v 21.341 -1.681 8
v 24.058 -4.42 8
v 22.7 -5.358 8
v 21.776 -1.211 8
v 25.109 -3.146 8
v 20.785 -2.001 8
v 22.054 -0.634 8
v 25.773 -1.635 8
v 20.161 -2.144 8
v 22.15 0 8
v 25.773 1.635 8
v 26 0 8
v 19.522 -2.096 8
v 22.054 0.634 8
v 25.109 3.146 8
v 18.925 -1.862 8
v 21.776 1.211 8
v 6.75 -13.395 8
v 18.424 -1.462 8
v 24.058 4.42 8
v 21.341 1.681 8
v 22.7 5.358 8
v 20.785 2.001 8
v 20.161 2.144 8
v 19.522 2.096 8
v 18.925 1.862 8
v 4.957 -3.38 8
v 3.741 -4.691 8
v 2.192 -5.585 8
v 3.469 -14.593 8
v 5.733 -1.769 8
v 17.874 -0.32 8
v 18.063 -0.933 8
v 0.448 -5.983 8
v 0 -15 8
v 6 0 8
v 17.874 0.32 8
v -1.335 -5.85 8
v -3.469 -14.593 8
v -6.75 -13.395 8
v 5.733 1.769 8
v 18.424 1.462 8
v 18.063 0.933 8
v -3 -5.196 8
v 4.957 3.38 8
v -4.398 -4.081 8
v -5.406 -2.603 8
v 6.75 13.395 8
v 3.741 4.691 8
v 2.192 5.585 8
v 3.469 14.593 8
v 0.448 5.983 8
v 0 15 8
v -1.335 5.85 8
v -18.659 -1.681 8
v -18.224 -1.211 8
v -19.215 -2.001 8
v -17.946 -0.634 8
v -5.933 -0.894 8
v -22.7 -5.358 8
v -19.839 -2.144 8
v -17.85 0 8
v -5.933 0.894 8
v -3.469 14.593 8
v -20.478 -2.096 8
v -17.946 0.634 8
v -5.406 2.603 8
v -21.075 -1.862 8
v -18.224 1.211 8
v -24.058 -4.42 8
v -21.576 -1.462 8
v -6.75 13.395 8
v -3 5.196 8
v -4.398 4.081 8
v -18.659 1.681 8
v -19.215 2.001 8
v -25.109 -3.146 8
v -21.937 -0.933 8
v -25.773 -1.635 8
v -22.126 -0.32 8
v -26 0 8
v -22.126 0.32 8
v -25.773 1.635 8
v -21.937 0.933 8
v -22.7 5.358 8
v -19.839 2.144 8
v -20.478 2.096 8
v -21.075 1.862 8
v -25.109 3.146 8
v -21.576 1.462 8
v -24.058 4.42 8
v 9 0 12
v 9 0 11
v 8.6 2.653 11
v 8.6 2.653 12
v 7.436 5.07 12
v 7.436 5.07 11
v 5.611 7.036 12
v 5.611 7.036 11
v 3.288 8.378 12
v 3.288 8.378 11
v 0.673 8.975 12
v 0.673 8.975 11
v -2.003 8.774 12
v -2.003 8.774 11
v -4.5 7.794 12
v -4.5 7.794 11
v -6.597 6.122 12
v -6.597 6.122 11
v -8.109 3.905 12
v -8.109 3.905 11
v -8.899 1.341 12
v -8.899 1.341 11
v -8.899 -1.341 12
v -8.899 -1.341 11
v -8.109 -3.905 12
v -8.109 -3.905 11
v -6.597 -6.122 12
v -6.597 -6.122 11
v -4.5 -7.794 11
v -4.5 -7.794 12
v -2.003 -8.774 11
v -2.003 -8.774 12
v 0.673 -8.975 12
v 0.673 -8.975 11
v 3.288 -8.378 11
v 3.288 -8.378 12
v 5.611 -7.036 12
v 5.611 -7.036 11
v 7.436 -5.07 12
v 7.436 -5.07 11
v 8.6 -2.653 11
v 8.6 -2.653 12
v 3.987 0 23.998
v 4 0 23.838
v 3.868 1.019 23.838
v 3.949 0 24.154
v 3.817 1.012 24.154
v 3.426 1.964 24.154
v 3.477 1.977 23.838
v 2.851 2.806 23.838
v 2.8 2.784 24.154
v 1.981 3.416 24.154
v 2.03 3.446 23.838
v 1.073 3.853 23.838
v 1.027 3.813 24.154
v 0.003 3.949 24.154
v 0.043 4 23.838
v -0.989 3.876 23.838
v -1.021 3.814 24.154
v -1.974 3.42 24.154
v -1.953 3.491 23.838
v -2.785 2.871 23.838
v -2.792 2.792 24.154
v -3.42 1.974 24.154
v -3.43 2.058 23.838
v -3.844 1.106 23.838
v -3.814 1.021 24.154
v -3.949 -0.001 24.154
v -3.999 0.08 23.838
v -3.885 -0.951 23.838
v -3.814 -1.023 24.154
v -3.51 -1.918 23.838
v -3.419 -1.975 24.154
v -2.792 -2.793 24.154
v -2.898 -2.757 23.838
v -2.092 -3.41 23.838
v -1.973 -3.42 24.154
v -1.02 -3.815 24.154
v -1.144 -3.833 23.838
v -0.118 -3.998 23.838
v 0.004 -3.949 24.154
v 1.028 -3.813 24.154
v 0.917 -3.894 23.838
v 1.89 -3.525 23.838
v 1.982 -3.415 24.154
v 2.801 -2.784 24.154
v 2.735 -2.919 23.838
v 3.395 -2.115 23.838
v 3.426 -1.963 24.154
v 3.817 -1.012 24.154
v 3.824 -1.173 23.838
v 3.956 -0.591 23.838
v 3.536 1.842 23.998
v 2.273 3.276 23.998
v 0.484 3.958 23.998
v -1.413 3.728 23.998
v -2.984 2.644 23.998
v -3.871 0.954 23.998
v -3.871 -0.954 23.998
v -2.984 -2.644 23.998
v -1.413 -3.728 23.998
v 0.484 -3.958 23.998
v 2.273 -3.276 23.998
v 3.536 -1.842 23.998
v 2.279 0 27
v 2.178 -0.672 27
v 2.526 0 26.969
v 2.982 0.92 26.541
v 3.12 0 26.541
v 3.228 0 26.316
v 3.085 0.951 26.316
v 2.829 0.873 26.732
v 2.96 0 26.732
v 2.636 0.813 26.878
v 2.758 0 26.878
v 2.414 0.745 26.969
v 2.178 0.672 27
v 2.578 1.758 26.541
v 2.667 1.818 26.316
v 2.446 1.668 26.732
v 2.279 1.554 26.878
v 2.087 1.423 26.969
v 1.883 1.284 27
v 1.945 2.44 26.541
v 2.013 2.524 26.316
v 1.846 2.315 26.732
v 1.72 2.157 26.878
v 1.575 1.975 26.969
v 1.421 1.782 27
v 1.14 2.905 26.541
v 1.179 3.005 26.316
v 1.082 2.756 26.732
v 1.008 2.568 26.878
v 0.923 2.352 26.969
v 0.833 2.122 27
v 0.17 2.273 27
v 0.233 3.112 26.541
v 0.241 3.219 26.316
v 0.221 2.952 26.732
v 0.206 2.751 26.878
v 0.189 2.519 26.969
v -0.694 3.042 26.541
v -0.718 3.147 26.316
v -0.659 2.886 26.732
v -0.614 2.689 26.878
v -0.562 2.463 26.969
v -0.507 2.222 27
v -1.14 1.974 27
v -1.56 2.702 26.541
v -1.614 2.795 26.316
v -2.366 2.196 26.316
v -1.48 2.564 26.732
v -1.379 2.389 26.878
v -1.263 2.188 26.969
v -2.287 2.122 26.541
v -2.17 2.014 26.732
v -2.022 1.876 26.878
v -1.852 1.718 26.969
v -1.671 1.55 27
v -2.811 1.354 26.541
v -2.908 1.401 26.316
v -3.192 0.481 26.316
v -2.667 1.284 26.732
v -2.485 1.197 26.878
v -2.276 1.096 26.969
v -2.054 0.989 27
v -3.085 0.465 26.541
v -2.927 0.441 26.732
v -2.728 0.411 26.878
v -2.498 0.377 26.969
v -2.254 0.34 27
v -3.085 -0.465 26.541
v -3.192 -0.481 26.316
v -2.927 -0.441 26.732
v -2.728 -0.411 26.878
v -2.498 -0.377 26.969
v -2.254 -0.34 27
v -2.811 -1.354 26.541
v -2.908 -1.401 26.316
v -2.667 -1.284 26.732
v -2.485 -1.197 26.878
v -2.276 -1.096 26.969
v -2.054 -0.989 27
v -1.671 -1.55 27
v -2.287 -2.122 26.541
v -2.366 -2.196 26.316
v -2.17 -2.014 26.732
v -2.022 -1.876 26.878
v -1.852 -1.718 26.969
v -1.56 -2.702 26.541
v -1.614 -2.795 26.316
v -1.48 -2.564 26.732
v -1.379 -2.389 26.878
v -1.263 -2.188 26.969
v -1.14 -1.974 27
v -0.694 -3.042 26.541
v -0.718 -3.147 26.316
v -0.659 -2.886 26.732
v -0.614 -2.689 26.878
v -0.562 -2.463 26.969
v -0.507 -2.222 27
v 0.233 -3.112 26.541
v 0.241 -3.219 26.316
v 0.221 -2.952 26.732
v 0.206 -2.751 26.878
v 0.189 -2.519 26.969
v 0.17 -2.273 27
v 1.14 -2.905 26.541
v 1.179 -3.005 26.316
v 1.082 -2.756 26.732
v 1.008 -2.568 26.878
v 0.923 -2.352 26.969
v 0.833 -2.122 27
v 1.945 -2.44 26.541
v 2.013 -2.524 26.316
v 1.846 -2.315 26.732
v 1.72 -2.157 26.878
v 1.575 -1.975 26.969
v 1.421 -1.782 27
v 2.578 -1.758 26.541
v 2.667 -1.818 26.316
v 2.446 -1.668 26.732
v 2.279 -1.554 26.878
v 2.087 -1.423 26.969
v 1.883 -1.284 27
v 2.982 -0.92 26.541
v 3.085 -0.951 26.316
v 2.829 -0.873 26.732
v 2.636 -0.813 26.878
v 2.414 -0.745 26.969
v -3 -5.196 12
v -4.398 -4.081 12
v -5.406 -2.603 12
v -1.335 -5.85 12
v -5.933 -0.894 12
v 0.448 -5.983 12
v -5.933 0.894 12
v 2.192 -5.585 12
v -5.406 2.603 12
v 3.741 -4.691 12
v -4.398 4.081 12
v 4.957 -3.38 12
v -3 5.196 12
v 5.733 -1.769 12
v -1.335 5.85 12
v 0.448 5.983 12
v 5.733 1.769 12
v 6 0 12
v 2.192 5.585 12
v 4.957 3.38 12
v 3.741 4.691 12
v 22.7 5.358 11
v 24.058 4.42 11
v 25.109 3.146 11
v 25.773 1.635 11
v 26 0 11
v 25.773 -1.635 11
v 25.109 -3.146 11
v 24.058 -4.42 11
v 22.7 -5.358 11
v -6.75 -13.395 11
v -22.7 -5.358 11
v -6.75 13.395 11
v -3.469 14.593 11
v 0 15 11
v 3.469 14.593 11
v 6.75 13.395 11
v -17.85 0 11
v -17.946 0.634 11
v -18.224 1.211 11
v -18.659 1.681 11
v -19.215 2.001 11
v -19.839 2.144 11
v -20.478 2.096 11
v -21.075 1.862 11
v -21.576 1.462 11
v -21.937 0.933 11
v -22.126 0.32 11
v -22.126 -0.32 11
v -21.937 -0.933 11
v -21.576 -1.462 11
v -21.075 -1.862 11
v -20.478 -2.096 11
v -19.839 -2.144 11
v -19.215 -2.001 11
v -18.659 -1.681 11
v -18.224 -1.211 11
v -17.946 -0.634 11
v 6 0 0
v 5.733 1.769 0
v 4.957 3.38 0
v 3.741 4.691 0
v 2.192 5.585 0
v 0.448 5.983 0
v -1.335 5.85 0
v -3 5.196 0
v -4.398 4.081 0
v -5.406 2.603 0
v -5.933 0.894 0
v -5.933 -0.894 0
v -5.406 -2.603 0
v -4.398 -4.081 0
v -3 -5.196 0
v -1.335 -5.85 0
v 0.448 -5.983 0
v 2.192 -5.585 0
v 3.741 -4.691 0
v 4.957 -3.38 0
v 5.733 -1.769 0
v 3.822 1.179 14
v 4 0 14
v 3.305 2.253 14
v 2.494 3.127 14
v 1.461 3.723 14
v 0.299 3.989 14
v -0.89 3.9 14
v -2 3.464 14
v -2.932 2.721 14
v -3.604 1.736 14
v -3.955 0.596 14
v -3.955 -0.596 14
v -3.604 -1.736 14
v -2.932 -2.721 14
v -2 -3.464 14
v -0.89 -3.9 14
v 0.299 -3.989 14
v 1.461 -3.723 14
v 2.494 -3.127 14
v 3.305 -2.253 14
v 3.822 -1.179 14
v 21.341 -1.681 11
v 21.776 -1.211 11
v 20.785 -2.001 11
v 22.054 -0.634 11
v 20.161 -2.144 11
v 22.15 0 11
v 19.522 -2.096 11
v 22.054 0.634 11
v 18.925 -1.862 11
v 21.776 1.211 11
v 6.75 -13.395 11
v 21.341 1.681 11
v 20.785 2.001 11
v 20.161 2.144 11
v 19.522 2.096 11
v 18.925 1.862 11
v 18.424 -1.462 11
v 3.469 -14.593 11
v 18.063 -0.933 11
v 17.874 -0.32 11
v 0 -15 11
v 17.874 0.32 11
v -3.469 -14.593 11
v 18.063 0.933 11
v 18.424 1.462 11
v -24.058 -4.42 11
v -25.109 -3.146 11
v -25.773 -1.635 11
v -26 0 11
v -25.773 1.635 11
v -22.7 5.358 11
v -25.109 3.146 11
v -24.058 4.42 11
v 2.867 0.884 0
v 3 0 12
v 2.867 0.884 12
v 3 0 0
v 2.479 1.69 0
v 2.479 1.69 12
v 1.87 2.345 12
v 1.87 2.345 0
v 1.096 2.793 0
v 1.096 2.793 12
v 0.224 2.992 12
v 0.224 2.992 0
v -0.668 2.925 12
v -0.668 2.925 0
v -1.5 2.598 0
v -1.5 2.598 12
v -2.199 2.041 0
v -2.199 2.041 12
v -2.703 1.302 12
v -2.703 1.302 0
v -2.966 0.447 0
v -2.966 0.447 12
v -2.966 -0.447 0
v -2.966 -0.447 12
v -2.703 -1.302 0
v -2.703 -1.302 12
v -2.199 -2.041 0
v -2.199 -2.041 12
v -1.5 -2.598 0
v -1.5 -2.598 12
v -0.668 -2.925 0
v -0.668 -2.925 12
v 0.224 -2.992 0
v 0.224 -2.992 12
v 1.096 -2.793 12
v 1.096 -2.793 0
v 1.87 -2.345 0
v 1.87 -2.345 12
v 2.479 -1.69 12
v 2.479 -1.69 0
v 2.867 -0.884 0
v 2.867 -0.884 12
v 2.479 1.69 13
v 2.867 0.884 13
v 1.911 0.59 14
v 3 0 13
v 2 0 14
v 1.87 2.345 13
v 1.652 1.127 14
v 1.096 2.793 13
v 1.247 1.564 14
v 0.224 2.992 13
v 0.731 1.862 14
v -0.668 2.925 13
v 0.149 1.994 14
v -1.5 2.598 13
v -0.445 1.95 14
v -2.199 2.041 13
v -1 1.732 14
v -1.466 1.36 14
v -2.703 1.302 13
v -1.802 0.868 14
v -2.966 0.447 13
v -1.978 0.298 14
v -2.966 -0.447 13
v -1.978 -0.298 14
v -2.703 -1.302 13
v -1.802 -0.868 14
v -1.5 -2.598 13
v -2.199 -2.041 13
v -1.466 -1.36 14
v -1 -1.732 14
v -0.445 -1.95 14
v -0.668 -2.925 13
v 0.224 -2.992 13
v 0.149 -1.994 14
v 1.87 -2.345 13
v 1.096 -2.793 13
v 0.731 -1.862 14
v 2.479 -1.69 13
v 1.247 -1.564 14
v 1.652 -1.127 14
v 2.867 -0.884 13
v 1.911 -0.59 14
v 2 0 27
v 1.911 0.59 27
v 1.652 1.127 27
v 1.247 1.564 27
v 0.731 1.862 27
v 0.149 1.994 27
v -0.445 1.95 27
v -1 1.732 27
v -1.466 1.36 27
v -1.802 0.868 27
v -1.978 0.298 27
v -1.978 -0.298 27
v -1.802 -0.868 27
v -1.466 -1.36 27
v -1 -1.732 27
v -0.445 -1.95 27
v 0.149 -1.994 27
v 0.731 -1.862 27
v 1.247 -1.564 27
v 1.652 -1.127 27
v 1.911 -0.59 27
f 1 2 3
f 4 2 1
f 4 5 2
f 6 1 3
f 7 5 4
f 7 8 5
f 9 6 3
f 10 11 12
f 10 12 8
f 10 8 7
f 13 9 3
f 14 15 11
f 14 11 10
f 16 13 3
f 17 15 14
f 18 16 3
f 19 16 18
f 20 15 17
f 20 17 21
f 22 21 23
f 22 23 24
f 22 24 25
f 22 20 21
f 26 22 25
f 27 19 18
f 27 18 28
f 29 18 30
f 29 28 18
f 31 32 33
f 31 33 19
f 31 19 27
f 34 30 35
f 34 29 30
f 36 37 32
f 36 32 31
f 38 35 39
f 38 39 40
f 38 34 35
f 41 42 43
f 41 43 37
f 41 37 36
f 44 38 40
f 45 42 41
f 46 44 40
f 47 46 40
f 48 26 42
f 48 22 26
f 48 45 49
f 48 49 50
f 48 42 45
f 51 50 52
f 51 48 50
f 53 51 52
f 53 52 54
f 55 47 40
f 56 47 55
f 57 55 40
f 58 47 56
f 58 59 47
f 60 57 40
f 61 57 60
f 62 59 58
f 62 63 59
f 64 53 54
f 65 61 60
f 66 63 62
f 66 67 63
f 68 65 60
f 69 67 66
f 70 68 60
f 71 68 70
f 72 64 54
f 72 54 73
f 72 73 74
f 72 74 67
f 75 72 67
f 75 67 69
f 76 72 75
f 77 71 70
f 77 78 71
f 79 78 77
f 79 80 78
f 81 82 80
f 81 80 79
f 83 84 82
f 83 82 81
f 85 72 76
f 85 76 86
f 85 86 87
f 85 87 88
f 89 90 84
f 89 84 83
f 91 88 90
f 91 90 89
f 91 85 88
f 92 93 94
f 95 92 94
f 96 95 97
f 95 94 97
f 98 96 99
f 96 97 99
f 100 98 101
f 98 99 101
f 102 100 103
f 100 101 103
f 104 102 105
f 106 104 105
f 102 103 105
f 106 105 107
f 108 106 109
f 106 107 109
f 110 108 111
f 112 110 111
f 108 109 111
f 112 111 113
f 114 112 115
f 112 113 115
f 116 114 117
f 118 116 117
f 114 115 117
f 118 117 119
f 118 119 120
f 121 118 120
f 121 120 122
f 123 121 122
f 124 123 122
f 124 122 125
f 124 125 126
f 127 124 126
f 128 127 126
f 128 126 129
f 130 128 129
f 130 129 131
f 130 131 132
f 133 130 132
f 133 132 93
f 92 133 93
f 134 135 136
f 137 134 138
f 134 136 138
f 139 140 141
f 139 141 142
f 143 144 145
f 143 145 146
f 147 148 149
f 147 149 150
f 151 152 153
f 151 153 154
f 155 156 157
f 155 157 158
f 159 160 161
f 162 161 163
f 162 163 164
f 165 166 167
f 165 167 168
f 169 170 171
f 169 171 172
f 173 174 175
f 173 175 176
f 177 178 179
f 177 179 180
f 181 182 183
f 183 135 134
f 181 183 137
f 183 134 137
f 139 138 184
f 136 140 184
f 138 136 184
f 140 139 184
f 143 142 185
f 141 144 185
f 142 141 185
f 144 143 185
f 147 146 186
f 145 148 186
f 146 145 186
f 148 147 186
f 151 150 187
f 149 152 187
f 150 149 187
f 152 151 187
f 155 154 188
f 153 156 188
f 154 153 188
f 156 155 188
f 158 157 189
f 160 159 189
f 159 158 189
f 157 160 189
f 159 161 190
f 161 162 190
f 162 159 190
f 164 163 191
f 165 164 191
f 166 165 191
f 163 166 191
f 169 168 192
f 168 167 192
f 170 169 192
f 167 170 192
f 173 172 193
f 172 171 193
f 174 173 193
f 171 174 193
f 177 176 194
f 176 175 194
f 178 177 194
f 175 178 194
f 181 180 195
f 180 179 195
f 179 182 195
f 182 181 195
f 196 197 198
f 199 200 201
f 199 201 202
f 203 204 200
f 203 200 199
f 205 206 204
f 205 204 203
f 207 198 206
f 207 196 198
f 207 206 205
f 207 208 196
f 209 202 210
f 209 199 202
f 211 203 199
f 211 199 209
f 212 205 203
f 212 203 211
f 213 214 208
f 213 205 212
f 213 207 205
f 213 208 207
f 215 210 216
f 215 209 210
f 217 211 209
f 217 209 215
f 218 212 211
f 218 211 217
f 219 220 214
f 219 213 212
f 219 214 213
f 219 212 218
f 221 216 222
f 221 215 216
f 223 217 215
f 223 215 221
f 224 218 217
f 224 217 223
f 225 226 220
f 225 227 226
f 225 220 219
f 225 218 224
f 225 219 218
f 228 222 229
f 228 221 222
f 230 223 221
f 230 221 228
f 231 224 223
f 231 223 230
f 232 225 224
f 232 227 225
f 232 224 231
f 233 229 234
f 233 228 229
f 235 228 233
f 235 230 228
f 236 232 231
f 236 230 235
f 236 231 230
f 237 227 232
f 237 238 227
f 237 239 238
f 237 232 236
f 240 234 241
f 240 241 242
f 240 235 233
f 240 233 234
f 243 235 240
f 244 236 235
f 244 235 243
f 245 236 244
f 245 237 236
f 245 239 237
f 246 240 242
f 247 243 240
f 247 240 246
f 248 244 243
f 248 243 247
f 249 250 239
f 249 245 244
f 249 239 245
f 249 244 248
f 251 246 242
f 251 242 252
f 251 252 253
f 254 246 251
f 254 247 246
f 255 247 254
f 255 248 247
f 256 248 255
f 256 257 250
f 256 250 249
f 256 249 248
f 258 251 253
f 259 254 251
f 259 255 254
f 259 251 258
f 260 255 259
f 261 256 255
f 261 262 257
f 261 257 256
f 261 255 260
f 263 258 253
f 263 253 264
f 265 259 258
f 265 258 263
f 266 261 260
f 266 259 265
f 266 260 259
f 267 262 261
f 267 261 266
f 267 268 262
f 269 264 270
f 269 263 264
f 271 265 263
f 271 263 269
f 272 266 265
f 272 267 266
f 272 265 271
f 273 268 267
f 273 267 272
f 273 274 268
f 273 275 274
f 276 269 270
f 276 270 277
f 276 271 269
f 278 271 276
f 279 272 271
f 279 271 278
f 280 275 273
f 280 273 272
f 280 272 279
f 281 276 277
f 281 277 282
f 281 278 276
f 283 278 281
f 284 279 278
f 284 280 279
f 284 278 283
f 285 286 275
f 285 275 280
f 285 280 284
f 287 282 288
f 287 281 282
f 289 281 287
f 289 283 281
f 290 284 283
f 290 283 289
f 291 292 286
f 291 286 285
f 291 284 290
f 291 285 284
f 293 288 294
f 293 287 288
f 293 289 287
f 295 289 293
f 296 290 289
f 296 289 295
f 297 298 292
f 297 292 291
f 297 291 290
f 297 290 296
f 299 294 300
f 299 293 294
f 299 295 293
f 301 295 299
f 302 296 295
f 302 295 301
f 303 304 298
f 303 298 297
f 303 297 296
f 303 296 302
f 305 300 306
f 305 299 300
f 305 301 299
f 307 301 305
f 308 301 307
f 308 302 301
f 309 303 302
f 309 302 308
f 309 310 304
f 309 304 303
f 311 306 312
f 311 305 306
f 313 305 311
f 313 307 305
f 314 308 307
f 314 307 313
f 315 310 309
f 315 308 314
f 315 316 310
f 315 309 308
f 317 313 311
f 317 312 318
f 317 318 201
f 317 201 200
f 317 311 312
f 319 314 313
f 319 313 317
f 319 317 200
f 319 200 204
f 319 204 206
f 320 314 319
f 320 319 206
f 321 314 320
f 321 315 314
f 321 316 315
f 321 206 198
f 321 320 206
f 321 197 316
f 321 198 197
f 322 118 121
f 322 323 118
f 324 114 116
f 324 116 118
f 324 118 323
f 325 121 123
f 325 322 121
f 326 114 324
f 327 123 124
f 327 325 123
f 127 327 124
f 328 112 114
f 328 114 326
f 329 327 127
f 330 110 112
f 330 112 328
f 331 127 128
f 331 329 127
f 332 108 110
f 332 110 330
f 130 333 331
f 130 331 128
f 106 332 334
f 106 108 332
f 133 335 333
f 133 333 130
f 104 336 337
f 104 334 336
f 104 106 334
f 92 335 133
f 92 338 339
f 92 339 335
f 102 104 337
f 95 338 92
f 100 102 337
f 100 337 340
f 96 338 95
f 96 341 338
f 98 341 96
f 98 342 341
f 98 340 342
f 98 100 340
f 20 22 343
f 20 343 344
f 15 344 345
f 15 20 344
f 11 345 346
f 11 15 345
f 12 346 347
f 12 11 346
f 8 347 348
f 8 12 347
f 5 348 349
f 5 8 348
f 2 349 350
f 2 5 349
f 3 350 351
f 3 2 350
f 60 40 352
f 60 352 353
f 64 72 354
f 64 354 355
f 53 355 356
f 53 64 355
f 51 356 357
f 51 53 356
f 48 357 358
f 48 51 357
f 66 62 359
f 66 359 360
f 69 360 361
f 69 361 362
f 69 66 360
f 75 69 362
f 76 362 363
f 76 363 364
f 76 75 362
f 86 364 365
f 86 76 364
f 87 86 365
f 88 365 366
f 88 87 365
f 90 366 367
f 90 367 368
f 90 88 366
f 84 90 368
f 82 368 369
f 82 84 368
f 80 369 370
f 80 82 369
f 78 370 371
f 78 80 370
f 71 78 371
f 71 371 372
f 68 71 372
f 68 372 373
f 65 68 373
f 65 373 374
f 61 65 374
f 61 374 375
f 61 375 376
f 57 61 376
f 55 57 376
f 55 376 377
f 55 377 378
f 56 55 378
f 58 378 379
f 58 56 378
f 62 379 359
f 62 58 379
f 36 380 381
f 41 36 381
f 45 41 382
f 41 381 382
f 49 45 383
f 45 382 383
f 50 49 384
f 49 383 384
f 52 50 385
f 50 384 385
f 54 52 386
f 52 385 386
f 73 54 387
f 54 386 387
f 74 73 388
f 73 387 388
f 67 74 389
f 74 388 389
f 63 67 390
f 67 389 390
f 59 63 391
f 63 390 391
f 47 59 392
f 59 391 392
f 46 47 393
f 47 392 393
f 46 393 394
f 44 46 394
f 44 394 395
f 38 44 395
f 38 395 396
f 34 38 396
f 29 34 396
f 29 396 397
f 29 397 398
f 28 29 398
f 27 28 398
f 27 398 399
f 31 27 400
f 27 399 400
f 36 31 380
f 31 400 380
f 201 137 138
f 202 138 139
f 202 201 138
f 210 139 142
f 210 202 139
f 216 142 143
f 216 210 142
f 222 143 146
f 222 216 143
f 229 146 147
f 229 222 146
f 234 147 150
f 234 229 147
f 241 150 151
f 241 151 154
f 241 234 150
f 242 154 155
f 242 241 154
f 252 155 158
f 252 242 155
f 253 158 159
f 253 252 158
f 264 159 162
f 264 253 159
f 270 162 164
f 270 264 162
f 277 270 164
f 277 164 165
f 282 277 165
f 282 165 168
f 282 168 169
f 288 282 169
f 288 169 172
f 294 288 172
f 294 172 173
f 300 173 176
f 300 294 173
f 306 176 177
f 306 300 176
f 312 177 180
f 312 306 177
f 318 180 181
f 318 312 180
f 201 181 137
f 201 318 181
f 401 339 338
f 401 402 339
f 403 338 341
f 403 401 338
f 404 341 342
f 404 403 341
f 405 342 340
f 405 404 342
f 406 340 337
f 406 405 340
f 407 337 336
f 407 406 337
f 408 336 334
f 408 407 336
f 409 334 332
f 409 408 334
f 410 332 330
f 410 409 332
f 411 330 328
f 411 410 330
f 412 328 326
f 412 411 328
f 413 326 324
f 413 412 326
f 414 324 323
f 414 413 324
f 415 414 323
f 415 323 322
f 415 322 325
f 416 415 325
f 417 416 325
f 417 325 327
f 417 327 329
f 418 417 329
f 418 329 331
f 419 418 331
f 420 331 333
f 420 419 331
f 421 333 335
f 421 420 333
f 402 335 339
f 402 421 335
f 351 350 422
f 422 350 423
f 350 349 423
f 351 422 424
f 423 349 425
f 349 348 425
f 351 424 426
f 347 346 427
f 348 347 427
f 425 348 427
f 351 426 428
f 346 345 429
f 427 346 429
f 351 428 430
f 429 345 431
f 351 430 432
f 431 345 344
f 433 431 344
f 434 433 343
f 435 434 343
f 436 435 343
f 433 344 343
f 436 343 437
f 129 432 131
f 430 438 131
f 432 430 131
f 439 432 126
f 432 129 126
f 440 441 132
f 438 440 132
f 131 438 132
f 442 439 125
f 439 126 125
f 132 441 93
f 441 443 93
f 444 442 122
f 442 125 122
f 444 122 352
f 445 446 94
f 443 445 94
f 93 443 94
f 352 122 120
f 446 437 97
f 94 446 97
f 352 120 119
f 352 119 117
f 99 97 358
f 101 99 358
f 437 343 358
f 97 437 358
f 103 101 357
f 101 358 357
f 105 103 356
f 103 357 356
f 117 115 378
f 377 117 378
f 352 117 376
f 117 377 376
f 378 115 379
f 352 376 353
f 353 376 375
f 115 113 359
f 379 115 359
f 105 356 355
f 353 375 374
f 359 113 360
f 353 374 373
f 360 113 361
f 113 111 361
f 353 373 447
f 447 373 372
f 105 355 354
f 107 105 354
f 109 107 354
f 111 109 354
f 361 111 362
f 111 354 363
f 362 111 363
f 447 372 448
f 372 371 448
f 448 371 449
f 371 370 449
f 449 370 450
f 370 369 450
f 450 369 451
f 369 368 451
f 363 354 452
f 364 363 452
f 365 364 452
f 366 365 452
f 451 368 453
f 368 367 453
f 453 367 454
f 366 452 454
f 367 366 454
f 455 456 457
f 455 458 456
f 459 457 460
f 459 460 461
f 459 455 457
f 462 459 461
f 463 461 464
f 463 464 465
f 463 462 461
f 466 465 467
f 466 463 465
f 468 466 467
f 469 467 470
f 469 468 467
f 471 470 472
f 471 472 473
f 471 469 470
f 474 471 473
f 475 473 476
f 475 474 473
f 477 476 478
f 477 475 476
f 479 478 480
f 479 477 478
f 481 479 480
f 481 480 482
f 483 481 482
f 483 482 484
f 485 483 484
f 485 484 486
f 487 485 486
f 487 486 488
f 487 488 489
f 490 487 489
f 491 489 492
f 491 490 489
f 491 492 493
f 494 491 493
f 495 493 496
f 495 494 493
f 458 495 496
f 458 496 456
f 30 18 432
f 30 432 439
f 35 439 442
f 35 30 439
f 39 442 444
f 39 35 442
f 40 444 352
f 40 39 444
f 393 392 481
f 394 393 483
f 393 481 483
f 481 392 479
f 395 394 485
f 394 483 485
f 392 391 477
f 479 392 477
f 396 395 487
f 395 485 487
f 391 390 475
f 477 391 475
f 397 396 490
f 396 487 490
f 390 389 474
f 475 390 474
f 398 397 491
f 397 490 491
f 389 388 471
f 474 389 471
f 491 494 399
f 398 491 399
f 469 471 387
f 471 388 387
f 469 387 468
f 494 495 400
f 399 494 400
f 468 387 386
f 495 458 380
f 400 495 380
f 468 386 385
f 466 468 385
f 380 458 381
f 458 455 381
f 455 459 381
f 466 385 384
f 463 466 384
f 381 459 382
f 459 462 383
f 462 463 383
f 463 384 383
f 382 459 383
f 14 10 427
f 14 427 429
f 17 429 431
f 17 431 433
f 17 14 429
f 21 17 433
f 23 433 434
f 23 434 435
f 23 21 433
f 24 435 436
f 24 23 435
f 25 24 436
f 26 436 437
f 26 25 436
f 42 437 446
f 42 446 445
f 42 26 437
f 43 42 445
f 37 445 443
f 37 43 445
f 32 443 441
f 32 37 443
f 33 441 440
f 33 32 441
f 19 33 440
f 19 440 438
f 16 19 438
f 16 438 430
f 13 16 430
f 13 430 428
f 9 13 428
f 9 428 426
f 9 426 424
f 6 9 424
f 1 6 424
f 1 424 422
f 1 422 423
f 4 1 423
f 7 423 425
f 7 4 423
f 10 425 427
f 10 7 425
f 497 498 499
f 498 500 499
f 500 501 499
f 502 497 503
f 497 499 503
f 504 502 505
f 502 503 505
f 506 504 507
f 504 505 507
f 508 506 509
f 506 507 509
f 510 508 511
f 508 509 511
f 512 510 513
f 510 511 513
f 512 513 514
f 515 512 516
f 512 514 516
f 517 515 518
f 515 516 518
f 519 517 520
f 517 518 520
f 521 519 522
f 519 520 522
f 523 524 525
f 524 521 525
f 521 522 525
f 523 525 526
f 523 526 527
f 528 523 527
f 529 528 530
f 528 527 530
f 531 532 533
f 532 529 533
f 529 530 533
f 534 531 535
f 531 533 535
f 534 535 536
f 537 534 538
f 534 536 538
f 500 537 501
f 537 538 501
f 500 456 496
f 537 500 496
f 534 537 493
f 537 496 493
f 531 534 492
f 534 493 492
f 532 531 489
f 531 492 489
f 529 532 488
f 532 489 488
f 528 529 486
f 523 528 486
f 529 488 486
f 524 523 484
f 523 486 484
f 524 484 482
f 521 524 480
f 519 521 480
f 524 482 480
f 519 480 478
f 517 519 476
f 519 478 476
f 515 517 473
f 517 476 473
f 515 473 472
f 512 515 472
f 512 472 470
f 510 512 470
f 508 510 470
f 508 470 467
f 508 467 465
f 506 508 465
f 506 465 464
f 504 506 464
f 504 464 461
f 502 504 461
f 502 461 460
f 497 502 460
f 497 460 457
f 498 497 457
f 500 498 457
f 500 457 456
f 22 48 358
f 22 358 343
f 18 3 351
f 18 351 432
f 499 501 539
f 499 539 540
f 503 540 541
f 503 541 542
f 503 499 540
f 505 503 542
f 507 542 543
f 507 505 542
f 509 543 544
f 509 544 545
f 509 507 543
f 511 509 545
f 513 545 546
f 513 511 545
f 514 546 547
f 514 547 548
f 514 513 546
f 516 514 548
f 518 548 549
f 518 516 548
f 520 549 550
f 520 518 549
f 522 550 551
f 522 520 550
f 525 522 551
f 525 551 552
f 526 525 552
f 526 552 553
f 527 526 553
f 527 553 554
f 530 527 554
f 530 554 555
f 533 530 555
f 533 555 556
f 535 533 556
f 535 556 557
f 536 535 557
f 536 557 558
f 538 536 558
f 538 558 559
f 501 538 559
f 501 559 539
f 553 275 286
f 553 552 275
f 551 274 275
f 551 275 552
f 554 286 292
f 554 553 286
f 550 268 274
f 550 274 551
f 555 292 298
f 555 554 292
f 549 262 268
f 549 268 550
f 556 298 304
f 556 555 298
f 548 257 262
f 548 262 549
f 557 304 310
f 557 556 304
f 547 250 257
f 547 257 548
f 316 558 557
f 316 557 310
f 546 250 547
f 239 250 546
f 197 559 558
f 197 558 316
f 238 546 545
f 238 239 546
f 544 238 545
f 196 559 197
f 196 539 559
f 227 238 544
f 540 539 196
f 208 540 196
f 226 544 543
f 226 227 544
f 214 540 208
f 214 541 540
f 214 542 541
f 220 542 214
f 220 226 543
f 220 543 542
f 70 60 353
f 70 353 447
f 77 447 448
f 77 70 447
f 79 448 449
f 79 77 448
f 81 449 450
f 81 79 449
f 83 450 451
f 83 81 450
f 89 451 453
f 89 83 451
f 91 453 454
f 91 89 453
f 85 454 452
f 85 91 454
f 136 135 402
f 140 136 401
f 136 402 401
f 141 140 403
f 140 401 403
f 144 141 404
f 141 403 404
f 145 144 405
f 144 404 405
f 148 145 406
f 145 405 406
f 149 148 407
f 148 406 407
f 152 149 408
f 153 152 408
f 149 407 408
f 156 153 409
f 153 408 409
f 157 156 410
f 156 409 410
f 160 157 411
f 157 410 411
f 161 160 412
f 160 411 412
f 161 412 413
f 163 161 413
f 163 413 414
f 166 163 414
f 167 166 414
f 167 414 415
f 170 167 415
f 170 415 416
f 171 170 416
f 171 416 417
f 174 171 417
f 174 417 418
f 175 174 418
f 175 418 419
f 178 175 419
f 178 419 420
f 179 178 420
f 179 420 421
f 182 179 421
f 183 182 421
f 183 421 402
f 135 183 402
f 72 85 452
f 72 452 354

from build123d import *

# Parameters (mm, degrees)
SKETCH_1_R      = 6
SKETCH_1_R_2    = 3
EXTRUDE_1_DEPTH = 8
SKETCH_2_R      = 9
SKETCH_2_R_2    = 3
EXTRUDE_2_DEPTH = 4
SKETCH_3_R      = 4
SKETCH_3_R_2    = 2
EXTRUDE_3_DEPTH = 15
CHAMFER_1_SIZE  = 2
CHAMFER_2_SIZE  = 3
CHAMFER_2_SIZE2 = 1
FILLET_1_R      = 1
SKETCH_4_R      = 9
SKETCH_4_R_2    = 2.15
EXTRUDE_5_DEPTH = 3


with BuildPart() as part:
    # 草图1 → 凸台-拉伸1 (new body)
    with BuildSketch(Plane.XY):
        Circle(SKETCH_1_R)
        Circle(SKETCH_1_R_2, mode=Mode.SUBTRACT)
    extrude(amount=EXTRUDE_1_DEPTH)

    # 草图2 → 凸台-拉伸2 (add)
    with BuildSketch(Plane.XY.offset(8)):
        Circle(SKETCH_2_R)
        Circle(SKETCH_2_R_2, mode=Mode.SUBTRACT)
    extrude(amount=EXTRUDE_2_DEPTH)

    # 草图3 → 凸台-拉伸3 (add)
    with BuildSketch(Plane.XY.offset(12)):
        Circle(SKETCH_3_R)
        Circle(SKETCH_3_R_2, mode=Mode.SUBTRACT)
    extrude(amount=EXTRUDE_3_DEPTH)

    # 倒角1
    # the kernel refuses this chamfer: 2 mm, written as the material it adds along each edge
    with BuildSketch(Plane(origin=(0, 0, 12), x_dir=(1, 0, 0), z_dir=(0, -1, 0))) as chamfer_1_piece_1:
        Polygon((4 + CHAMFER_1_SIZE, 0), (4, CHAMFER_1_SIZE), (4, 0), align=None)
    revolve(axis=Axis((0, 0, 12), (0, 0, 1)))
    # the kernel refuses this chamfer: 2 mm, written as the material it takes off along each edge
    with BuildSketch(Plane(origin=(0, 0, 12), x_dir=(1, 0, 0), z_dir=(0, -1, 0))) as chamfer_1_2_piece_1_section:
        Polygon((2 + CHAMFER_1_SIZE, 0), (2, CHAMFER_1_SIZE), (2, 0), align=None)
    chamfer_1_2_piece_1 = revolve(axis=Axis((0, 0, 12), (0, 0, 1)), mode=Mode.PRIVATE)
    chamfer_1_2_piece_1 = chamfer_1_2_piece_1 & Plane(origin=(0, 0, 13.507652587), x_dir=(1, 0, 0), z_dir=(0, 0, -1)) * Cylinder(3, 16, mode=Mode.PRIVATE)
    add(chamfer_1_2_piece_1, mode=Mode.SUBTRACT)

    # 倒角2
    chamfer_2_edges = [part.edges().sort_by_distance(p)[0] for p in [
        (-4, 0, 27),
    ]]
    chamfer_2_side = [part.faces().sort_by_distance(p)[0] for p in [
        (-4, 0, 20.5),
    ]]
    chamfer(chamfer_2_edges, length=CHAMFER_2_SIZE, length2=CHAMFER_2_SIZE2, reference=chamfer_2_side[0])

    # 圆角1
    fillet_1_edges = [part.edges().sort_by_distance(p)[0] for p in [
        (-3, 0, 27),
        (-4, 0, 24),
    ]]
    fillet(fillet_1_edges, radius=FILLET_1_R)

    # 草图4 → 凸台-拉伸5 (add)
    with BuildSketch(Plane.XY.offset(8)):
        with BuildLine():
            Line((-22.7, 5.35817133), (-6.75, 13.395428325))
            ThreePointArc((-6.75, 13.395428325), (0, 15), (6.75, 13.395428325))
            Line((6.75, 13.395428325), (22.7, 5.35817133))
            ThreePointArc((22.7, 5.35817133), (26, 0), (22.7, -5.35817133))
            Line((22.7, -5.35817133), (6.75, -13.395428325))
            ThreePointArc((6.75, -13.395428325), (0, -15), (-6.75, -13.395428325))
            Line((-6.75, -13.395428325), (-22.7, -5.35817133))
            ThreePointArc((-22.7, -5.35817133), (-26, 0), (-22.7, 5.35817133))
        make_face()
        Circle(SKETCH_4_R, mode=Mode.SUBTRACT)
        with Locations((20, 0)):
            Circle(SKETCH_4_R_2, mode=Mode.SUBTRACT)
        with Locations((-20, 0)):
            Circle(SKETCH_4_R_2, mode=Mode.SUBTRACT)
    extrude(amount=EXTRUDE_5_DEPTH)


solid = part.part
